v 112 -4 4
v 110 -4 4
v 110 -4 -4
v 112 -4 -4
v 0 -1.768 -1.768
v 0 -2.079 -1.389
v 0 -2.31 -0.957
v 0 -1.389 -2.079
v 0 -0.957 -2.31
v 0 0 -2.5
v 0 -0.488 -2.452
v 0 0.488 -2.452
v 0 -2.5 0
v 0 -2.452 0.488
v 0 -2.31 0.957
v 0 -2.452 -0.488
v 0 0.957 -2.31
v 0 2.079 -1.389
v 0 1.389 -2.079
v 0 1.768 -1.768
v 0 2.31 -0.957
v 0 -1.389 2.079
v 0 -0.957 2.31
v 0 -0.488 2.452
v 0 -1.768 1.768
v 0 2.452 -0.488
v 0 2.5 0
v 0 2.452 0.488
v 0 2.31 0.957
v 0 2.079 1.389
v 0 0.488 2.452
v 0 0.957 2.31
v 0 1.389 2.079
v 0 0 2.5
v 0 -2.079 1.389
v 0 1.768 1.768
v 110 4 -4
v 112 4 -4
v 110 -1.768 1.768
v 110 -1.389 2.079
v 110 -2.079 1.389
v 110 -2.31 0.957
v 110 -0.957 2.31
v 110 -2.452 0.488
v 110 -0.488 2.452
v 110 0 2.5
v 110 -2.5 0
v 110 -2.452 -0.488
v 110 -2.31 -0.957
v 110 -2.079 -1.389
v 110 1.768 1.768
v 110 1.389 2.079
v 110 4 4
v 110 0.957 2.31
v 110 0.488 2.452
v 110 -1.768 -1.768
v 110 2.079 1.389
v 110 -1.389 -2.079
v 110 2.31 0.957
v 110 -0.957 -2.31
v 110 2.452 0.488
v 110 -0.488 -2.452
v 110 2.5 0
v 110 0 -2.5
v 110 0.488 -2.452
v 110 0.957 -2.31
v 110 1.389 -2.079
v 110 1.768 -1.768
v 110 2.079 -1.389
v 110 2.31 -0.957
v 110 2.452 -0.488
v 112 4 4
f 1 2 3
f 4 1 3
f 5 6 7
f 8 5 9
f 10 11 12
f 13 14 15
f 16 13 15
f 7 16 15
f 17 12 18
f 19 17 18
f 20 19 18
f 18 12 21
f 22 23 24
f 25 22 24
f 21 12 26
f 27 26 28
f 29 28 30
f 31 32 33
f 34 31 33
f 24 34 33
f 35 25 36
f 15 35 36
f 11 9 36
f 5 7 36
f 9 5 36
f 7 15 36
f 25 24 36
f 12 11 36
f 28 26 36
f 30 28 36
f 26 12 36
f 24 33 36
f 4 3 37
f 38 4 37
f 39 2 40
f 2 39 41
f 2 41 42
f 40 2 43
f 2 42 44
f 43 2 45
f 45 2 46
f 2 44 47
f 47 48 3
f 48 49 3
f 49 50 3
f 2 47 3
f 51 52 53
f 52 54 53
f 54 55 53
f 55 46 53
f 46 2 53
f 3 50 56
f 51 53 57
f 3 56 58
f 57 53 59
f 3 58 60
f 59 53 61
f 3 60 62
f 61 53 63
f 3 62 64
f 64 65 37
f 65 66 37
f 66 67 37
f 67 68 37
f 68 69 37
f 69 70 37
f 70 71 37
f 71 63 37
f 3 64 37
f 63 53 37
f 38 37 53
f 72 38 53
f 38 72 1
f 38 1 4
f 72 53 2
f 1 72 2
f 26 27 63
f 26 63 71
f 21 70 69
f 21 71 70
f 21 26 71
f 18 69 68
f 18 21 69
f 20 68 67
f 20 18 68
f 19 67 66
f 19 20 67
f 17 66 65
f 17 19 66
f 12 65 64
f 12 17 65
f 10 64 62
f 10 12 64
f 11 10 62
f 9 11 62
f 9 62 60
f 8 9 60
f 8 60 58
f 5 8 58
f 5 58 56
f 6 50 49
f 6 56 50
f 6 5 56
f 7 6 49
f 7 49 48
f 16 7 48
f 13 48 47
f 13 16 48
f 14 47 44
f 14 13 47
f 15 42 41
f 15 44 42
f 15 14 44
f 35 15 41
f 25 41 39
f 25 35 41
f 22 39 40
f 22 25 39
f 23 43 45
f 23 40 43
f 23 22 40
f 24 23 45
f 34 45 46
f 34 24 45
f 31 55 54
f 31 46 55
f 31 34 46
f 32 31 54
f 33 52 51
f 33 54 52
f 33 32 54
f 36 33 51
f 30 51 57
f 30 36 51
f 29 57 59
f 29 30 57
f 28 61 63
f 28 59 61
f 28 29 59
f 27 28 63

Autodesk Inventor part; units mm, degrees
ref_plane "YZ Plane" through (0, 0, 0) normal (1, 0, 0) x (0, 1, 0)
ref_plane "XZ Plane" through (0, 0, 0) normal (0, 1, 0) x (-1, 0, 0)
ref_plane "XY Plane" through (0, 0, 0) normal (0, 0, 1) x (1, 0, 0)
sketch "Sketch1" plane through (0, 0, 0) normal (1, 0, 0) x (0, 1, 0)
  circle A0 centre (0, 0) radius 2.5
  dimension "d0" = 5
extrude "Extrusion1" add sketch "Sketch1" along normal blind 110
sketch "Sketch2" plane through (110, 0, 0) normal (1, 0, 0) x (0, 0, -1)
  circle A0 centre (0, 0) radius 2.5 construction
  line L0 (4, 4) -> (-4, 4)
  line L1 (-4, 4) -> (-4, -4)
  line L2 (-4, -4) -> (4, -4)
  line L3 (4, -4) -> (4, 4)
  line L4 (4, 4) -> (-4, -4) construction
  line L5 (-4, 4) -> (4, -4) construction
  dimension "d5" = 8
  dimension "d6" = 8
extrude "Extrusion2" add sketch "Sketch2" along normal blind 2
properties part number "shaft"
